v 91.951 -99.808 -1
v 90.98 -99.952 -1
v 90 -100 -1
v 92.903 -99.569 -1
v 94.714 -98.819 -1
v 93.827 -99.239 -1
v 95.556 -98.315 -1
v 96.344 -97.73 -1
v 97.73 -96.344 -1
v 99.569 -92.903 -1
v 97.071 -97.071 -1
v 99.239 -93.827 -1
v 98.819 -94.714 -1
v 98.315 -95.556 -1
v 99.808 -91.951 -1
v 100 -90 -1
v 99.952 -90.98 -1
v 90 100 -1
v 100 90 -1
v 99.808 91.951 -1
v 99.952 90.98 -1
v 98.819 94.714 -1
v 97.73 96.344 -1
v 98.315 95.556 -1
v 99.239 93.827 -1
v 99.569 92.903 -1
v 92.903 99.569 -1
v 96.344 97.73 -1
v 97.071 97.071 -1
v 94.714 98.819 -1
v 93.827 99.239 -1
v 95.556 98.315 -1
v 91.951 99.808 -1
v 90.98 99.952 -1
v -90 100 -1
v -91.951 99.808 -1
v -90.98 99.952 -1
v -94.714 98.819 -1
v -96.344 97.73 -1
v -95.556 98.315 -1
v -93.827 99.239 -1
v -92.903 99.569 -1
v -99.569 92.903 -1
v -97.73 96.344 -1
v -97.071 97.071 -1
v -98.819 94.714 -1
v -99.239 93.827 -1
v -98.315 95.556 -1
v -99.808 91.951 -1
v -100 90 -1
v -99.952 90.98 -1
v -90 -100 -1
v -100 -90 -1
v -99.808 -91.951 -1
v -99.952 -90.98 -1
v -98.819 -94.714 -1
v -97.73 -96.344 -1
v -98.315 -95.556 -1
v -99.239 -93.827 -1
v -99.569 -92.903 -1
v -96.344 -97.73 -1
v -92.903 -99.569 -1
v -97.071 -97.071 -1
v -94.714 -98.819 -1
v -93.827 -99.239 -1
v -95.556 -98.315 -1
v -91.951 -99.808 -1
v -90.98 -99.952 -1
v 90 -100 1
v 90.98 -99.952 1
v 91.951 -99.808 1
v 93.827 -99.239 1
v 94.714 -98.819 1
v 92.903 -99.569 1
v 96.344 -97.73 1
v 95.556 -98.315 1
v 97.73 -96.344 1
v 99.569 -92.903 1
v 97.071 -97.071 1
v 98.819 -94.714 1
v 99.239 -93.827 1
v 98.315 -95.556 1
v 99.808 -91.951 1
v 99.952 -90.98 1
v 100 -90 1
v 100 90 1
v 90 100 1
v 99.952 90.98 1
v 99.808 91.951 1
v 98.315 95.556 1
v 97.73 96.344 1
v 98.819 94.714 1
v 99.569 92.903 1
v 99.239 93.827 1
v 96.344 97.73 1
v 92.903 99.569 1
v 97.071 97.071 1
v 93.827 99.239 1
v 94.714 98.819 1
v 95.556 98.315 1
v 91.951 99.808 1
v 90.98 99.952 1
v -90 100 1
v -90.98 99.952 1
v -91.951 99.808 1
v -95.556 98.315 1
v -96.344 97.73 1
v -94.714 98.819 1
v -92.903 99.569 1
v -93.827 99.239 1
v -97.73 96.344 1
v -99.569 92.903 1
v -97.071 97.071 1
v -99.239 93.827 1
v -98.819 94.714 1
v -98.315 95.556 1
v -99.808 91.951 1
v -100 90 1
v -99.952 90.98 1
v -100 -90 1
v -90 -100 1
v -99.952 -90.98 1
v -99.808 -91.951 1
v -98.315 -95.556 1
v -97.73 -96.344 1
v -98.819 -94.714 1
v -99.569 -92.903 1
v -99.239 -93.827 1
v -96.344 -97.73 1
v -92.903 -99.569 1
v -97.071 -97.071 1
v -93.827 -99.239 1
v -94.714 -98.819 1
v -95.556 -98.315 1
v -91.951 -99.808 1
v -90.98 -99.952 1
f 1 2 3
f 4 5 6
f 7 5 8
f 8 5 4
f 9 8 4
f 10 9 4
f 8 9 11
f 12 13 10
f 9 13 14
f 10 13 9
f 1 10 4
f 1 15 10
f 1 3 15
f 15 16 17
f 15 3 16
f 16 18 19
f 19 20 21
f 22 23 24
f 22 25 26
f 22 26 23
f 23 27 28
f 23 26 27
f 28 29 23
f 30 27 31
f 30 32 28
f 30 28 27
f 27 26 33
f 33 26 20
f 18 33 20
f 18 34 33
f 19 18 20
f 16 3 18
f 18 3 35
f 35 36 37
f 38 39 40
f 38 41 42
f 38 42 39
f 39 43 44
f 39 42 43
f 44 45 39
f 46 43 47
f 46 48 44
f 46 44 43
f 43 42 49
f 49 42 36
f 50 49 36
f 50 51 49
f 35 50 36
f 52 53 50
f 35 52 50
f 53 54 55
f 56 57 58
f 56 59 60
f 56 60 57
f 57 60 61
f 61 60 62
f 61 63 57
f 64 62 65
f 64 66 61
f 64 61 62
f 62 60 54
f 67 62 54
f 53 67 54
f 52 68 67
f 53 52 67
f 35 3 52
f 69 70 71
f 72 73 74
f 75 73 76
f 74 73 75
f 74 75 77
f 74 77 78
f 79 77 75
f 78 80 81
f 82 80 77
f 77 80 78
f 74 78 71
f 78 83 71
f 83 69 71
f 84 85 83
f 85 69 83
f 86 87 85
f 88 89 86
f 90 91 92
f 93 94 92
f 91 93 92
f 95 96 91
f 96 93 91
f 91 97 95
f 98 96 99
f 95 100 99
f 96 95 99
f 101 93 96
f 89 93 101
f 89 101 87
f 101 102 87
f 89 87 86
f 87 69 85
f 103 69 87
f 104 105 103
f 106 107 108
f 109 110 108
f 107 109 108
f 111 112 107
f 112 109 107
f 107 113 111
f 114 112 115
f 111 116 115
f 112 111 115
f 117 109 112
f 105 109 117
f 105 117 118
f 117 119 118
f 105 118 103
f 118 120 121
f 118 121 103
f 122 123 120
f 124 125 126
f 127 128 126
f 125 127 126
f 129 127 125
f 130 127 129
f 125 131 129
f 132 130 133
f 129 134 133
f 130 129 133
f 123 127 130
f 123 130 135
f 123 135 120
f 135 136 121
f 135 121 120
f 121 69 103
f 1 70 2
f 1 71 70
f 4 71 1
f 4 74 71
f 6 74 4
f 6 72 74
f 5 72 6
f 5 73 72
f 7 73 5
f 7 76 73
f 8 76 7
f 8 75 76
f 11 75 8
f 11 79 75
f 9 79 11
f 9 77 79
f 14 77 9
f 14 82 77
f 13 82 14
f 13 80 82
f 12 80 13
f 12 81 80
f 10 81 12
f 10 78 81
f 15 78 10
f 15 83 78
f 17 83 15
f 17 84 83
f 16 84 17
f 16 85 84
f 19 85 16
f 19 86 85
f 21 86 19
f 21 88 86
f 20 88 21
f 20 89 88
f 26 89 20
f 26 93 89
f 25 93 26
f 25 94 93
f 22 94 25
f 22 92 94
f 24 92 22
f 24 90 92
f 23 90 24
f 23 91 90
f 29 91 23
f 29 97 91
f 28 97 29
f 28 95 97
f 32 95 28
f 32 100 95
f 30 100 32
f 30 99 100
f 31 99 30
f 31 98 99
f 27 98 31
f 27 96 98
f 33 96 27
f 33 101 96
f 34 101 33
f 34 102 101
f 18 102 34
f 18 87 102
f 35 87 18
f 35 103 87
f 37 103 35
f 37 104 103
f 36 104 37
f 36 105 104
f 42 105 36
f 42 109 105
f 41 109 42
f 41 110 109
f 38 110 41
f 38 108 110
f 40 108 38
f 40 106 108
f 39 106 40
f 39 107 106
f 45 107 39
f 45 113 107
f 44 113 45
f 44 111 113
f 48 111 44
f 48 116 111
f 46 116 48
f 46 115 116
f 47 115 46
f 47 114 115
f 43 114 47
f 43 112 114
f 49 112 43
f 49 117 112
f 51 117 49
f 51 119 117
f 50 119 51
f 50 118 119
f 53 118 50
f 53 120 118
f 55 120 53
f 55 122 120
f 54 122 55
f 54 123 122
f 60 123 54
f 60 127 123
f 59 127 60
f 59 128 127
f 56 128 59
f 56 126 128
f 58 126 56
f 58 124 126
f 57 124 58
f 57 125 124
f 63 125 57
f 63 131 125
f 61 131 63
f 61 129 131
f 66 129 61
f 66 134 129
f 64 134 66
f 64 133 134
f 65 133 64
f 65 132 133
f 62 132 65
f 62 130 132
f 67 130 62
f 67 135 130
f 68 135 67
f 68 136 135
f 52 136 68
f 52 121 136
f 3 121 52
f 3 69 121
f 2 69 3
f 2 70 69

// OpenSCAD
$fn=64;

module sheet_silicone(length=200, width=200, thickness=2, corner_r=10){
    corner = min(corner_r, min(length, width)/2);
    linear_extrude(height=thickness, center=true)
        offset(r=corner)
            square([length-2*corner, width-2*corner], center=true);
}

sheet_silicone();
